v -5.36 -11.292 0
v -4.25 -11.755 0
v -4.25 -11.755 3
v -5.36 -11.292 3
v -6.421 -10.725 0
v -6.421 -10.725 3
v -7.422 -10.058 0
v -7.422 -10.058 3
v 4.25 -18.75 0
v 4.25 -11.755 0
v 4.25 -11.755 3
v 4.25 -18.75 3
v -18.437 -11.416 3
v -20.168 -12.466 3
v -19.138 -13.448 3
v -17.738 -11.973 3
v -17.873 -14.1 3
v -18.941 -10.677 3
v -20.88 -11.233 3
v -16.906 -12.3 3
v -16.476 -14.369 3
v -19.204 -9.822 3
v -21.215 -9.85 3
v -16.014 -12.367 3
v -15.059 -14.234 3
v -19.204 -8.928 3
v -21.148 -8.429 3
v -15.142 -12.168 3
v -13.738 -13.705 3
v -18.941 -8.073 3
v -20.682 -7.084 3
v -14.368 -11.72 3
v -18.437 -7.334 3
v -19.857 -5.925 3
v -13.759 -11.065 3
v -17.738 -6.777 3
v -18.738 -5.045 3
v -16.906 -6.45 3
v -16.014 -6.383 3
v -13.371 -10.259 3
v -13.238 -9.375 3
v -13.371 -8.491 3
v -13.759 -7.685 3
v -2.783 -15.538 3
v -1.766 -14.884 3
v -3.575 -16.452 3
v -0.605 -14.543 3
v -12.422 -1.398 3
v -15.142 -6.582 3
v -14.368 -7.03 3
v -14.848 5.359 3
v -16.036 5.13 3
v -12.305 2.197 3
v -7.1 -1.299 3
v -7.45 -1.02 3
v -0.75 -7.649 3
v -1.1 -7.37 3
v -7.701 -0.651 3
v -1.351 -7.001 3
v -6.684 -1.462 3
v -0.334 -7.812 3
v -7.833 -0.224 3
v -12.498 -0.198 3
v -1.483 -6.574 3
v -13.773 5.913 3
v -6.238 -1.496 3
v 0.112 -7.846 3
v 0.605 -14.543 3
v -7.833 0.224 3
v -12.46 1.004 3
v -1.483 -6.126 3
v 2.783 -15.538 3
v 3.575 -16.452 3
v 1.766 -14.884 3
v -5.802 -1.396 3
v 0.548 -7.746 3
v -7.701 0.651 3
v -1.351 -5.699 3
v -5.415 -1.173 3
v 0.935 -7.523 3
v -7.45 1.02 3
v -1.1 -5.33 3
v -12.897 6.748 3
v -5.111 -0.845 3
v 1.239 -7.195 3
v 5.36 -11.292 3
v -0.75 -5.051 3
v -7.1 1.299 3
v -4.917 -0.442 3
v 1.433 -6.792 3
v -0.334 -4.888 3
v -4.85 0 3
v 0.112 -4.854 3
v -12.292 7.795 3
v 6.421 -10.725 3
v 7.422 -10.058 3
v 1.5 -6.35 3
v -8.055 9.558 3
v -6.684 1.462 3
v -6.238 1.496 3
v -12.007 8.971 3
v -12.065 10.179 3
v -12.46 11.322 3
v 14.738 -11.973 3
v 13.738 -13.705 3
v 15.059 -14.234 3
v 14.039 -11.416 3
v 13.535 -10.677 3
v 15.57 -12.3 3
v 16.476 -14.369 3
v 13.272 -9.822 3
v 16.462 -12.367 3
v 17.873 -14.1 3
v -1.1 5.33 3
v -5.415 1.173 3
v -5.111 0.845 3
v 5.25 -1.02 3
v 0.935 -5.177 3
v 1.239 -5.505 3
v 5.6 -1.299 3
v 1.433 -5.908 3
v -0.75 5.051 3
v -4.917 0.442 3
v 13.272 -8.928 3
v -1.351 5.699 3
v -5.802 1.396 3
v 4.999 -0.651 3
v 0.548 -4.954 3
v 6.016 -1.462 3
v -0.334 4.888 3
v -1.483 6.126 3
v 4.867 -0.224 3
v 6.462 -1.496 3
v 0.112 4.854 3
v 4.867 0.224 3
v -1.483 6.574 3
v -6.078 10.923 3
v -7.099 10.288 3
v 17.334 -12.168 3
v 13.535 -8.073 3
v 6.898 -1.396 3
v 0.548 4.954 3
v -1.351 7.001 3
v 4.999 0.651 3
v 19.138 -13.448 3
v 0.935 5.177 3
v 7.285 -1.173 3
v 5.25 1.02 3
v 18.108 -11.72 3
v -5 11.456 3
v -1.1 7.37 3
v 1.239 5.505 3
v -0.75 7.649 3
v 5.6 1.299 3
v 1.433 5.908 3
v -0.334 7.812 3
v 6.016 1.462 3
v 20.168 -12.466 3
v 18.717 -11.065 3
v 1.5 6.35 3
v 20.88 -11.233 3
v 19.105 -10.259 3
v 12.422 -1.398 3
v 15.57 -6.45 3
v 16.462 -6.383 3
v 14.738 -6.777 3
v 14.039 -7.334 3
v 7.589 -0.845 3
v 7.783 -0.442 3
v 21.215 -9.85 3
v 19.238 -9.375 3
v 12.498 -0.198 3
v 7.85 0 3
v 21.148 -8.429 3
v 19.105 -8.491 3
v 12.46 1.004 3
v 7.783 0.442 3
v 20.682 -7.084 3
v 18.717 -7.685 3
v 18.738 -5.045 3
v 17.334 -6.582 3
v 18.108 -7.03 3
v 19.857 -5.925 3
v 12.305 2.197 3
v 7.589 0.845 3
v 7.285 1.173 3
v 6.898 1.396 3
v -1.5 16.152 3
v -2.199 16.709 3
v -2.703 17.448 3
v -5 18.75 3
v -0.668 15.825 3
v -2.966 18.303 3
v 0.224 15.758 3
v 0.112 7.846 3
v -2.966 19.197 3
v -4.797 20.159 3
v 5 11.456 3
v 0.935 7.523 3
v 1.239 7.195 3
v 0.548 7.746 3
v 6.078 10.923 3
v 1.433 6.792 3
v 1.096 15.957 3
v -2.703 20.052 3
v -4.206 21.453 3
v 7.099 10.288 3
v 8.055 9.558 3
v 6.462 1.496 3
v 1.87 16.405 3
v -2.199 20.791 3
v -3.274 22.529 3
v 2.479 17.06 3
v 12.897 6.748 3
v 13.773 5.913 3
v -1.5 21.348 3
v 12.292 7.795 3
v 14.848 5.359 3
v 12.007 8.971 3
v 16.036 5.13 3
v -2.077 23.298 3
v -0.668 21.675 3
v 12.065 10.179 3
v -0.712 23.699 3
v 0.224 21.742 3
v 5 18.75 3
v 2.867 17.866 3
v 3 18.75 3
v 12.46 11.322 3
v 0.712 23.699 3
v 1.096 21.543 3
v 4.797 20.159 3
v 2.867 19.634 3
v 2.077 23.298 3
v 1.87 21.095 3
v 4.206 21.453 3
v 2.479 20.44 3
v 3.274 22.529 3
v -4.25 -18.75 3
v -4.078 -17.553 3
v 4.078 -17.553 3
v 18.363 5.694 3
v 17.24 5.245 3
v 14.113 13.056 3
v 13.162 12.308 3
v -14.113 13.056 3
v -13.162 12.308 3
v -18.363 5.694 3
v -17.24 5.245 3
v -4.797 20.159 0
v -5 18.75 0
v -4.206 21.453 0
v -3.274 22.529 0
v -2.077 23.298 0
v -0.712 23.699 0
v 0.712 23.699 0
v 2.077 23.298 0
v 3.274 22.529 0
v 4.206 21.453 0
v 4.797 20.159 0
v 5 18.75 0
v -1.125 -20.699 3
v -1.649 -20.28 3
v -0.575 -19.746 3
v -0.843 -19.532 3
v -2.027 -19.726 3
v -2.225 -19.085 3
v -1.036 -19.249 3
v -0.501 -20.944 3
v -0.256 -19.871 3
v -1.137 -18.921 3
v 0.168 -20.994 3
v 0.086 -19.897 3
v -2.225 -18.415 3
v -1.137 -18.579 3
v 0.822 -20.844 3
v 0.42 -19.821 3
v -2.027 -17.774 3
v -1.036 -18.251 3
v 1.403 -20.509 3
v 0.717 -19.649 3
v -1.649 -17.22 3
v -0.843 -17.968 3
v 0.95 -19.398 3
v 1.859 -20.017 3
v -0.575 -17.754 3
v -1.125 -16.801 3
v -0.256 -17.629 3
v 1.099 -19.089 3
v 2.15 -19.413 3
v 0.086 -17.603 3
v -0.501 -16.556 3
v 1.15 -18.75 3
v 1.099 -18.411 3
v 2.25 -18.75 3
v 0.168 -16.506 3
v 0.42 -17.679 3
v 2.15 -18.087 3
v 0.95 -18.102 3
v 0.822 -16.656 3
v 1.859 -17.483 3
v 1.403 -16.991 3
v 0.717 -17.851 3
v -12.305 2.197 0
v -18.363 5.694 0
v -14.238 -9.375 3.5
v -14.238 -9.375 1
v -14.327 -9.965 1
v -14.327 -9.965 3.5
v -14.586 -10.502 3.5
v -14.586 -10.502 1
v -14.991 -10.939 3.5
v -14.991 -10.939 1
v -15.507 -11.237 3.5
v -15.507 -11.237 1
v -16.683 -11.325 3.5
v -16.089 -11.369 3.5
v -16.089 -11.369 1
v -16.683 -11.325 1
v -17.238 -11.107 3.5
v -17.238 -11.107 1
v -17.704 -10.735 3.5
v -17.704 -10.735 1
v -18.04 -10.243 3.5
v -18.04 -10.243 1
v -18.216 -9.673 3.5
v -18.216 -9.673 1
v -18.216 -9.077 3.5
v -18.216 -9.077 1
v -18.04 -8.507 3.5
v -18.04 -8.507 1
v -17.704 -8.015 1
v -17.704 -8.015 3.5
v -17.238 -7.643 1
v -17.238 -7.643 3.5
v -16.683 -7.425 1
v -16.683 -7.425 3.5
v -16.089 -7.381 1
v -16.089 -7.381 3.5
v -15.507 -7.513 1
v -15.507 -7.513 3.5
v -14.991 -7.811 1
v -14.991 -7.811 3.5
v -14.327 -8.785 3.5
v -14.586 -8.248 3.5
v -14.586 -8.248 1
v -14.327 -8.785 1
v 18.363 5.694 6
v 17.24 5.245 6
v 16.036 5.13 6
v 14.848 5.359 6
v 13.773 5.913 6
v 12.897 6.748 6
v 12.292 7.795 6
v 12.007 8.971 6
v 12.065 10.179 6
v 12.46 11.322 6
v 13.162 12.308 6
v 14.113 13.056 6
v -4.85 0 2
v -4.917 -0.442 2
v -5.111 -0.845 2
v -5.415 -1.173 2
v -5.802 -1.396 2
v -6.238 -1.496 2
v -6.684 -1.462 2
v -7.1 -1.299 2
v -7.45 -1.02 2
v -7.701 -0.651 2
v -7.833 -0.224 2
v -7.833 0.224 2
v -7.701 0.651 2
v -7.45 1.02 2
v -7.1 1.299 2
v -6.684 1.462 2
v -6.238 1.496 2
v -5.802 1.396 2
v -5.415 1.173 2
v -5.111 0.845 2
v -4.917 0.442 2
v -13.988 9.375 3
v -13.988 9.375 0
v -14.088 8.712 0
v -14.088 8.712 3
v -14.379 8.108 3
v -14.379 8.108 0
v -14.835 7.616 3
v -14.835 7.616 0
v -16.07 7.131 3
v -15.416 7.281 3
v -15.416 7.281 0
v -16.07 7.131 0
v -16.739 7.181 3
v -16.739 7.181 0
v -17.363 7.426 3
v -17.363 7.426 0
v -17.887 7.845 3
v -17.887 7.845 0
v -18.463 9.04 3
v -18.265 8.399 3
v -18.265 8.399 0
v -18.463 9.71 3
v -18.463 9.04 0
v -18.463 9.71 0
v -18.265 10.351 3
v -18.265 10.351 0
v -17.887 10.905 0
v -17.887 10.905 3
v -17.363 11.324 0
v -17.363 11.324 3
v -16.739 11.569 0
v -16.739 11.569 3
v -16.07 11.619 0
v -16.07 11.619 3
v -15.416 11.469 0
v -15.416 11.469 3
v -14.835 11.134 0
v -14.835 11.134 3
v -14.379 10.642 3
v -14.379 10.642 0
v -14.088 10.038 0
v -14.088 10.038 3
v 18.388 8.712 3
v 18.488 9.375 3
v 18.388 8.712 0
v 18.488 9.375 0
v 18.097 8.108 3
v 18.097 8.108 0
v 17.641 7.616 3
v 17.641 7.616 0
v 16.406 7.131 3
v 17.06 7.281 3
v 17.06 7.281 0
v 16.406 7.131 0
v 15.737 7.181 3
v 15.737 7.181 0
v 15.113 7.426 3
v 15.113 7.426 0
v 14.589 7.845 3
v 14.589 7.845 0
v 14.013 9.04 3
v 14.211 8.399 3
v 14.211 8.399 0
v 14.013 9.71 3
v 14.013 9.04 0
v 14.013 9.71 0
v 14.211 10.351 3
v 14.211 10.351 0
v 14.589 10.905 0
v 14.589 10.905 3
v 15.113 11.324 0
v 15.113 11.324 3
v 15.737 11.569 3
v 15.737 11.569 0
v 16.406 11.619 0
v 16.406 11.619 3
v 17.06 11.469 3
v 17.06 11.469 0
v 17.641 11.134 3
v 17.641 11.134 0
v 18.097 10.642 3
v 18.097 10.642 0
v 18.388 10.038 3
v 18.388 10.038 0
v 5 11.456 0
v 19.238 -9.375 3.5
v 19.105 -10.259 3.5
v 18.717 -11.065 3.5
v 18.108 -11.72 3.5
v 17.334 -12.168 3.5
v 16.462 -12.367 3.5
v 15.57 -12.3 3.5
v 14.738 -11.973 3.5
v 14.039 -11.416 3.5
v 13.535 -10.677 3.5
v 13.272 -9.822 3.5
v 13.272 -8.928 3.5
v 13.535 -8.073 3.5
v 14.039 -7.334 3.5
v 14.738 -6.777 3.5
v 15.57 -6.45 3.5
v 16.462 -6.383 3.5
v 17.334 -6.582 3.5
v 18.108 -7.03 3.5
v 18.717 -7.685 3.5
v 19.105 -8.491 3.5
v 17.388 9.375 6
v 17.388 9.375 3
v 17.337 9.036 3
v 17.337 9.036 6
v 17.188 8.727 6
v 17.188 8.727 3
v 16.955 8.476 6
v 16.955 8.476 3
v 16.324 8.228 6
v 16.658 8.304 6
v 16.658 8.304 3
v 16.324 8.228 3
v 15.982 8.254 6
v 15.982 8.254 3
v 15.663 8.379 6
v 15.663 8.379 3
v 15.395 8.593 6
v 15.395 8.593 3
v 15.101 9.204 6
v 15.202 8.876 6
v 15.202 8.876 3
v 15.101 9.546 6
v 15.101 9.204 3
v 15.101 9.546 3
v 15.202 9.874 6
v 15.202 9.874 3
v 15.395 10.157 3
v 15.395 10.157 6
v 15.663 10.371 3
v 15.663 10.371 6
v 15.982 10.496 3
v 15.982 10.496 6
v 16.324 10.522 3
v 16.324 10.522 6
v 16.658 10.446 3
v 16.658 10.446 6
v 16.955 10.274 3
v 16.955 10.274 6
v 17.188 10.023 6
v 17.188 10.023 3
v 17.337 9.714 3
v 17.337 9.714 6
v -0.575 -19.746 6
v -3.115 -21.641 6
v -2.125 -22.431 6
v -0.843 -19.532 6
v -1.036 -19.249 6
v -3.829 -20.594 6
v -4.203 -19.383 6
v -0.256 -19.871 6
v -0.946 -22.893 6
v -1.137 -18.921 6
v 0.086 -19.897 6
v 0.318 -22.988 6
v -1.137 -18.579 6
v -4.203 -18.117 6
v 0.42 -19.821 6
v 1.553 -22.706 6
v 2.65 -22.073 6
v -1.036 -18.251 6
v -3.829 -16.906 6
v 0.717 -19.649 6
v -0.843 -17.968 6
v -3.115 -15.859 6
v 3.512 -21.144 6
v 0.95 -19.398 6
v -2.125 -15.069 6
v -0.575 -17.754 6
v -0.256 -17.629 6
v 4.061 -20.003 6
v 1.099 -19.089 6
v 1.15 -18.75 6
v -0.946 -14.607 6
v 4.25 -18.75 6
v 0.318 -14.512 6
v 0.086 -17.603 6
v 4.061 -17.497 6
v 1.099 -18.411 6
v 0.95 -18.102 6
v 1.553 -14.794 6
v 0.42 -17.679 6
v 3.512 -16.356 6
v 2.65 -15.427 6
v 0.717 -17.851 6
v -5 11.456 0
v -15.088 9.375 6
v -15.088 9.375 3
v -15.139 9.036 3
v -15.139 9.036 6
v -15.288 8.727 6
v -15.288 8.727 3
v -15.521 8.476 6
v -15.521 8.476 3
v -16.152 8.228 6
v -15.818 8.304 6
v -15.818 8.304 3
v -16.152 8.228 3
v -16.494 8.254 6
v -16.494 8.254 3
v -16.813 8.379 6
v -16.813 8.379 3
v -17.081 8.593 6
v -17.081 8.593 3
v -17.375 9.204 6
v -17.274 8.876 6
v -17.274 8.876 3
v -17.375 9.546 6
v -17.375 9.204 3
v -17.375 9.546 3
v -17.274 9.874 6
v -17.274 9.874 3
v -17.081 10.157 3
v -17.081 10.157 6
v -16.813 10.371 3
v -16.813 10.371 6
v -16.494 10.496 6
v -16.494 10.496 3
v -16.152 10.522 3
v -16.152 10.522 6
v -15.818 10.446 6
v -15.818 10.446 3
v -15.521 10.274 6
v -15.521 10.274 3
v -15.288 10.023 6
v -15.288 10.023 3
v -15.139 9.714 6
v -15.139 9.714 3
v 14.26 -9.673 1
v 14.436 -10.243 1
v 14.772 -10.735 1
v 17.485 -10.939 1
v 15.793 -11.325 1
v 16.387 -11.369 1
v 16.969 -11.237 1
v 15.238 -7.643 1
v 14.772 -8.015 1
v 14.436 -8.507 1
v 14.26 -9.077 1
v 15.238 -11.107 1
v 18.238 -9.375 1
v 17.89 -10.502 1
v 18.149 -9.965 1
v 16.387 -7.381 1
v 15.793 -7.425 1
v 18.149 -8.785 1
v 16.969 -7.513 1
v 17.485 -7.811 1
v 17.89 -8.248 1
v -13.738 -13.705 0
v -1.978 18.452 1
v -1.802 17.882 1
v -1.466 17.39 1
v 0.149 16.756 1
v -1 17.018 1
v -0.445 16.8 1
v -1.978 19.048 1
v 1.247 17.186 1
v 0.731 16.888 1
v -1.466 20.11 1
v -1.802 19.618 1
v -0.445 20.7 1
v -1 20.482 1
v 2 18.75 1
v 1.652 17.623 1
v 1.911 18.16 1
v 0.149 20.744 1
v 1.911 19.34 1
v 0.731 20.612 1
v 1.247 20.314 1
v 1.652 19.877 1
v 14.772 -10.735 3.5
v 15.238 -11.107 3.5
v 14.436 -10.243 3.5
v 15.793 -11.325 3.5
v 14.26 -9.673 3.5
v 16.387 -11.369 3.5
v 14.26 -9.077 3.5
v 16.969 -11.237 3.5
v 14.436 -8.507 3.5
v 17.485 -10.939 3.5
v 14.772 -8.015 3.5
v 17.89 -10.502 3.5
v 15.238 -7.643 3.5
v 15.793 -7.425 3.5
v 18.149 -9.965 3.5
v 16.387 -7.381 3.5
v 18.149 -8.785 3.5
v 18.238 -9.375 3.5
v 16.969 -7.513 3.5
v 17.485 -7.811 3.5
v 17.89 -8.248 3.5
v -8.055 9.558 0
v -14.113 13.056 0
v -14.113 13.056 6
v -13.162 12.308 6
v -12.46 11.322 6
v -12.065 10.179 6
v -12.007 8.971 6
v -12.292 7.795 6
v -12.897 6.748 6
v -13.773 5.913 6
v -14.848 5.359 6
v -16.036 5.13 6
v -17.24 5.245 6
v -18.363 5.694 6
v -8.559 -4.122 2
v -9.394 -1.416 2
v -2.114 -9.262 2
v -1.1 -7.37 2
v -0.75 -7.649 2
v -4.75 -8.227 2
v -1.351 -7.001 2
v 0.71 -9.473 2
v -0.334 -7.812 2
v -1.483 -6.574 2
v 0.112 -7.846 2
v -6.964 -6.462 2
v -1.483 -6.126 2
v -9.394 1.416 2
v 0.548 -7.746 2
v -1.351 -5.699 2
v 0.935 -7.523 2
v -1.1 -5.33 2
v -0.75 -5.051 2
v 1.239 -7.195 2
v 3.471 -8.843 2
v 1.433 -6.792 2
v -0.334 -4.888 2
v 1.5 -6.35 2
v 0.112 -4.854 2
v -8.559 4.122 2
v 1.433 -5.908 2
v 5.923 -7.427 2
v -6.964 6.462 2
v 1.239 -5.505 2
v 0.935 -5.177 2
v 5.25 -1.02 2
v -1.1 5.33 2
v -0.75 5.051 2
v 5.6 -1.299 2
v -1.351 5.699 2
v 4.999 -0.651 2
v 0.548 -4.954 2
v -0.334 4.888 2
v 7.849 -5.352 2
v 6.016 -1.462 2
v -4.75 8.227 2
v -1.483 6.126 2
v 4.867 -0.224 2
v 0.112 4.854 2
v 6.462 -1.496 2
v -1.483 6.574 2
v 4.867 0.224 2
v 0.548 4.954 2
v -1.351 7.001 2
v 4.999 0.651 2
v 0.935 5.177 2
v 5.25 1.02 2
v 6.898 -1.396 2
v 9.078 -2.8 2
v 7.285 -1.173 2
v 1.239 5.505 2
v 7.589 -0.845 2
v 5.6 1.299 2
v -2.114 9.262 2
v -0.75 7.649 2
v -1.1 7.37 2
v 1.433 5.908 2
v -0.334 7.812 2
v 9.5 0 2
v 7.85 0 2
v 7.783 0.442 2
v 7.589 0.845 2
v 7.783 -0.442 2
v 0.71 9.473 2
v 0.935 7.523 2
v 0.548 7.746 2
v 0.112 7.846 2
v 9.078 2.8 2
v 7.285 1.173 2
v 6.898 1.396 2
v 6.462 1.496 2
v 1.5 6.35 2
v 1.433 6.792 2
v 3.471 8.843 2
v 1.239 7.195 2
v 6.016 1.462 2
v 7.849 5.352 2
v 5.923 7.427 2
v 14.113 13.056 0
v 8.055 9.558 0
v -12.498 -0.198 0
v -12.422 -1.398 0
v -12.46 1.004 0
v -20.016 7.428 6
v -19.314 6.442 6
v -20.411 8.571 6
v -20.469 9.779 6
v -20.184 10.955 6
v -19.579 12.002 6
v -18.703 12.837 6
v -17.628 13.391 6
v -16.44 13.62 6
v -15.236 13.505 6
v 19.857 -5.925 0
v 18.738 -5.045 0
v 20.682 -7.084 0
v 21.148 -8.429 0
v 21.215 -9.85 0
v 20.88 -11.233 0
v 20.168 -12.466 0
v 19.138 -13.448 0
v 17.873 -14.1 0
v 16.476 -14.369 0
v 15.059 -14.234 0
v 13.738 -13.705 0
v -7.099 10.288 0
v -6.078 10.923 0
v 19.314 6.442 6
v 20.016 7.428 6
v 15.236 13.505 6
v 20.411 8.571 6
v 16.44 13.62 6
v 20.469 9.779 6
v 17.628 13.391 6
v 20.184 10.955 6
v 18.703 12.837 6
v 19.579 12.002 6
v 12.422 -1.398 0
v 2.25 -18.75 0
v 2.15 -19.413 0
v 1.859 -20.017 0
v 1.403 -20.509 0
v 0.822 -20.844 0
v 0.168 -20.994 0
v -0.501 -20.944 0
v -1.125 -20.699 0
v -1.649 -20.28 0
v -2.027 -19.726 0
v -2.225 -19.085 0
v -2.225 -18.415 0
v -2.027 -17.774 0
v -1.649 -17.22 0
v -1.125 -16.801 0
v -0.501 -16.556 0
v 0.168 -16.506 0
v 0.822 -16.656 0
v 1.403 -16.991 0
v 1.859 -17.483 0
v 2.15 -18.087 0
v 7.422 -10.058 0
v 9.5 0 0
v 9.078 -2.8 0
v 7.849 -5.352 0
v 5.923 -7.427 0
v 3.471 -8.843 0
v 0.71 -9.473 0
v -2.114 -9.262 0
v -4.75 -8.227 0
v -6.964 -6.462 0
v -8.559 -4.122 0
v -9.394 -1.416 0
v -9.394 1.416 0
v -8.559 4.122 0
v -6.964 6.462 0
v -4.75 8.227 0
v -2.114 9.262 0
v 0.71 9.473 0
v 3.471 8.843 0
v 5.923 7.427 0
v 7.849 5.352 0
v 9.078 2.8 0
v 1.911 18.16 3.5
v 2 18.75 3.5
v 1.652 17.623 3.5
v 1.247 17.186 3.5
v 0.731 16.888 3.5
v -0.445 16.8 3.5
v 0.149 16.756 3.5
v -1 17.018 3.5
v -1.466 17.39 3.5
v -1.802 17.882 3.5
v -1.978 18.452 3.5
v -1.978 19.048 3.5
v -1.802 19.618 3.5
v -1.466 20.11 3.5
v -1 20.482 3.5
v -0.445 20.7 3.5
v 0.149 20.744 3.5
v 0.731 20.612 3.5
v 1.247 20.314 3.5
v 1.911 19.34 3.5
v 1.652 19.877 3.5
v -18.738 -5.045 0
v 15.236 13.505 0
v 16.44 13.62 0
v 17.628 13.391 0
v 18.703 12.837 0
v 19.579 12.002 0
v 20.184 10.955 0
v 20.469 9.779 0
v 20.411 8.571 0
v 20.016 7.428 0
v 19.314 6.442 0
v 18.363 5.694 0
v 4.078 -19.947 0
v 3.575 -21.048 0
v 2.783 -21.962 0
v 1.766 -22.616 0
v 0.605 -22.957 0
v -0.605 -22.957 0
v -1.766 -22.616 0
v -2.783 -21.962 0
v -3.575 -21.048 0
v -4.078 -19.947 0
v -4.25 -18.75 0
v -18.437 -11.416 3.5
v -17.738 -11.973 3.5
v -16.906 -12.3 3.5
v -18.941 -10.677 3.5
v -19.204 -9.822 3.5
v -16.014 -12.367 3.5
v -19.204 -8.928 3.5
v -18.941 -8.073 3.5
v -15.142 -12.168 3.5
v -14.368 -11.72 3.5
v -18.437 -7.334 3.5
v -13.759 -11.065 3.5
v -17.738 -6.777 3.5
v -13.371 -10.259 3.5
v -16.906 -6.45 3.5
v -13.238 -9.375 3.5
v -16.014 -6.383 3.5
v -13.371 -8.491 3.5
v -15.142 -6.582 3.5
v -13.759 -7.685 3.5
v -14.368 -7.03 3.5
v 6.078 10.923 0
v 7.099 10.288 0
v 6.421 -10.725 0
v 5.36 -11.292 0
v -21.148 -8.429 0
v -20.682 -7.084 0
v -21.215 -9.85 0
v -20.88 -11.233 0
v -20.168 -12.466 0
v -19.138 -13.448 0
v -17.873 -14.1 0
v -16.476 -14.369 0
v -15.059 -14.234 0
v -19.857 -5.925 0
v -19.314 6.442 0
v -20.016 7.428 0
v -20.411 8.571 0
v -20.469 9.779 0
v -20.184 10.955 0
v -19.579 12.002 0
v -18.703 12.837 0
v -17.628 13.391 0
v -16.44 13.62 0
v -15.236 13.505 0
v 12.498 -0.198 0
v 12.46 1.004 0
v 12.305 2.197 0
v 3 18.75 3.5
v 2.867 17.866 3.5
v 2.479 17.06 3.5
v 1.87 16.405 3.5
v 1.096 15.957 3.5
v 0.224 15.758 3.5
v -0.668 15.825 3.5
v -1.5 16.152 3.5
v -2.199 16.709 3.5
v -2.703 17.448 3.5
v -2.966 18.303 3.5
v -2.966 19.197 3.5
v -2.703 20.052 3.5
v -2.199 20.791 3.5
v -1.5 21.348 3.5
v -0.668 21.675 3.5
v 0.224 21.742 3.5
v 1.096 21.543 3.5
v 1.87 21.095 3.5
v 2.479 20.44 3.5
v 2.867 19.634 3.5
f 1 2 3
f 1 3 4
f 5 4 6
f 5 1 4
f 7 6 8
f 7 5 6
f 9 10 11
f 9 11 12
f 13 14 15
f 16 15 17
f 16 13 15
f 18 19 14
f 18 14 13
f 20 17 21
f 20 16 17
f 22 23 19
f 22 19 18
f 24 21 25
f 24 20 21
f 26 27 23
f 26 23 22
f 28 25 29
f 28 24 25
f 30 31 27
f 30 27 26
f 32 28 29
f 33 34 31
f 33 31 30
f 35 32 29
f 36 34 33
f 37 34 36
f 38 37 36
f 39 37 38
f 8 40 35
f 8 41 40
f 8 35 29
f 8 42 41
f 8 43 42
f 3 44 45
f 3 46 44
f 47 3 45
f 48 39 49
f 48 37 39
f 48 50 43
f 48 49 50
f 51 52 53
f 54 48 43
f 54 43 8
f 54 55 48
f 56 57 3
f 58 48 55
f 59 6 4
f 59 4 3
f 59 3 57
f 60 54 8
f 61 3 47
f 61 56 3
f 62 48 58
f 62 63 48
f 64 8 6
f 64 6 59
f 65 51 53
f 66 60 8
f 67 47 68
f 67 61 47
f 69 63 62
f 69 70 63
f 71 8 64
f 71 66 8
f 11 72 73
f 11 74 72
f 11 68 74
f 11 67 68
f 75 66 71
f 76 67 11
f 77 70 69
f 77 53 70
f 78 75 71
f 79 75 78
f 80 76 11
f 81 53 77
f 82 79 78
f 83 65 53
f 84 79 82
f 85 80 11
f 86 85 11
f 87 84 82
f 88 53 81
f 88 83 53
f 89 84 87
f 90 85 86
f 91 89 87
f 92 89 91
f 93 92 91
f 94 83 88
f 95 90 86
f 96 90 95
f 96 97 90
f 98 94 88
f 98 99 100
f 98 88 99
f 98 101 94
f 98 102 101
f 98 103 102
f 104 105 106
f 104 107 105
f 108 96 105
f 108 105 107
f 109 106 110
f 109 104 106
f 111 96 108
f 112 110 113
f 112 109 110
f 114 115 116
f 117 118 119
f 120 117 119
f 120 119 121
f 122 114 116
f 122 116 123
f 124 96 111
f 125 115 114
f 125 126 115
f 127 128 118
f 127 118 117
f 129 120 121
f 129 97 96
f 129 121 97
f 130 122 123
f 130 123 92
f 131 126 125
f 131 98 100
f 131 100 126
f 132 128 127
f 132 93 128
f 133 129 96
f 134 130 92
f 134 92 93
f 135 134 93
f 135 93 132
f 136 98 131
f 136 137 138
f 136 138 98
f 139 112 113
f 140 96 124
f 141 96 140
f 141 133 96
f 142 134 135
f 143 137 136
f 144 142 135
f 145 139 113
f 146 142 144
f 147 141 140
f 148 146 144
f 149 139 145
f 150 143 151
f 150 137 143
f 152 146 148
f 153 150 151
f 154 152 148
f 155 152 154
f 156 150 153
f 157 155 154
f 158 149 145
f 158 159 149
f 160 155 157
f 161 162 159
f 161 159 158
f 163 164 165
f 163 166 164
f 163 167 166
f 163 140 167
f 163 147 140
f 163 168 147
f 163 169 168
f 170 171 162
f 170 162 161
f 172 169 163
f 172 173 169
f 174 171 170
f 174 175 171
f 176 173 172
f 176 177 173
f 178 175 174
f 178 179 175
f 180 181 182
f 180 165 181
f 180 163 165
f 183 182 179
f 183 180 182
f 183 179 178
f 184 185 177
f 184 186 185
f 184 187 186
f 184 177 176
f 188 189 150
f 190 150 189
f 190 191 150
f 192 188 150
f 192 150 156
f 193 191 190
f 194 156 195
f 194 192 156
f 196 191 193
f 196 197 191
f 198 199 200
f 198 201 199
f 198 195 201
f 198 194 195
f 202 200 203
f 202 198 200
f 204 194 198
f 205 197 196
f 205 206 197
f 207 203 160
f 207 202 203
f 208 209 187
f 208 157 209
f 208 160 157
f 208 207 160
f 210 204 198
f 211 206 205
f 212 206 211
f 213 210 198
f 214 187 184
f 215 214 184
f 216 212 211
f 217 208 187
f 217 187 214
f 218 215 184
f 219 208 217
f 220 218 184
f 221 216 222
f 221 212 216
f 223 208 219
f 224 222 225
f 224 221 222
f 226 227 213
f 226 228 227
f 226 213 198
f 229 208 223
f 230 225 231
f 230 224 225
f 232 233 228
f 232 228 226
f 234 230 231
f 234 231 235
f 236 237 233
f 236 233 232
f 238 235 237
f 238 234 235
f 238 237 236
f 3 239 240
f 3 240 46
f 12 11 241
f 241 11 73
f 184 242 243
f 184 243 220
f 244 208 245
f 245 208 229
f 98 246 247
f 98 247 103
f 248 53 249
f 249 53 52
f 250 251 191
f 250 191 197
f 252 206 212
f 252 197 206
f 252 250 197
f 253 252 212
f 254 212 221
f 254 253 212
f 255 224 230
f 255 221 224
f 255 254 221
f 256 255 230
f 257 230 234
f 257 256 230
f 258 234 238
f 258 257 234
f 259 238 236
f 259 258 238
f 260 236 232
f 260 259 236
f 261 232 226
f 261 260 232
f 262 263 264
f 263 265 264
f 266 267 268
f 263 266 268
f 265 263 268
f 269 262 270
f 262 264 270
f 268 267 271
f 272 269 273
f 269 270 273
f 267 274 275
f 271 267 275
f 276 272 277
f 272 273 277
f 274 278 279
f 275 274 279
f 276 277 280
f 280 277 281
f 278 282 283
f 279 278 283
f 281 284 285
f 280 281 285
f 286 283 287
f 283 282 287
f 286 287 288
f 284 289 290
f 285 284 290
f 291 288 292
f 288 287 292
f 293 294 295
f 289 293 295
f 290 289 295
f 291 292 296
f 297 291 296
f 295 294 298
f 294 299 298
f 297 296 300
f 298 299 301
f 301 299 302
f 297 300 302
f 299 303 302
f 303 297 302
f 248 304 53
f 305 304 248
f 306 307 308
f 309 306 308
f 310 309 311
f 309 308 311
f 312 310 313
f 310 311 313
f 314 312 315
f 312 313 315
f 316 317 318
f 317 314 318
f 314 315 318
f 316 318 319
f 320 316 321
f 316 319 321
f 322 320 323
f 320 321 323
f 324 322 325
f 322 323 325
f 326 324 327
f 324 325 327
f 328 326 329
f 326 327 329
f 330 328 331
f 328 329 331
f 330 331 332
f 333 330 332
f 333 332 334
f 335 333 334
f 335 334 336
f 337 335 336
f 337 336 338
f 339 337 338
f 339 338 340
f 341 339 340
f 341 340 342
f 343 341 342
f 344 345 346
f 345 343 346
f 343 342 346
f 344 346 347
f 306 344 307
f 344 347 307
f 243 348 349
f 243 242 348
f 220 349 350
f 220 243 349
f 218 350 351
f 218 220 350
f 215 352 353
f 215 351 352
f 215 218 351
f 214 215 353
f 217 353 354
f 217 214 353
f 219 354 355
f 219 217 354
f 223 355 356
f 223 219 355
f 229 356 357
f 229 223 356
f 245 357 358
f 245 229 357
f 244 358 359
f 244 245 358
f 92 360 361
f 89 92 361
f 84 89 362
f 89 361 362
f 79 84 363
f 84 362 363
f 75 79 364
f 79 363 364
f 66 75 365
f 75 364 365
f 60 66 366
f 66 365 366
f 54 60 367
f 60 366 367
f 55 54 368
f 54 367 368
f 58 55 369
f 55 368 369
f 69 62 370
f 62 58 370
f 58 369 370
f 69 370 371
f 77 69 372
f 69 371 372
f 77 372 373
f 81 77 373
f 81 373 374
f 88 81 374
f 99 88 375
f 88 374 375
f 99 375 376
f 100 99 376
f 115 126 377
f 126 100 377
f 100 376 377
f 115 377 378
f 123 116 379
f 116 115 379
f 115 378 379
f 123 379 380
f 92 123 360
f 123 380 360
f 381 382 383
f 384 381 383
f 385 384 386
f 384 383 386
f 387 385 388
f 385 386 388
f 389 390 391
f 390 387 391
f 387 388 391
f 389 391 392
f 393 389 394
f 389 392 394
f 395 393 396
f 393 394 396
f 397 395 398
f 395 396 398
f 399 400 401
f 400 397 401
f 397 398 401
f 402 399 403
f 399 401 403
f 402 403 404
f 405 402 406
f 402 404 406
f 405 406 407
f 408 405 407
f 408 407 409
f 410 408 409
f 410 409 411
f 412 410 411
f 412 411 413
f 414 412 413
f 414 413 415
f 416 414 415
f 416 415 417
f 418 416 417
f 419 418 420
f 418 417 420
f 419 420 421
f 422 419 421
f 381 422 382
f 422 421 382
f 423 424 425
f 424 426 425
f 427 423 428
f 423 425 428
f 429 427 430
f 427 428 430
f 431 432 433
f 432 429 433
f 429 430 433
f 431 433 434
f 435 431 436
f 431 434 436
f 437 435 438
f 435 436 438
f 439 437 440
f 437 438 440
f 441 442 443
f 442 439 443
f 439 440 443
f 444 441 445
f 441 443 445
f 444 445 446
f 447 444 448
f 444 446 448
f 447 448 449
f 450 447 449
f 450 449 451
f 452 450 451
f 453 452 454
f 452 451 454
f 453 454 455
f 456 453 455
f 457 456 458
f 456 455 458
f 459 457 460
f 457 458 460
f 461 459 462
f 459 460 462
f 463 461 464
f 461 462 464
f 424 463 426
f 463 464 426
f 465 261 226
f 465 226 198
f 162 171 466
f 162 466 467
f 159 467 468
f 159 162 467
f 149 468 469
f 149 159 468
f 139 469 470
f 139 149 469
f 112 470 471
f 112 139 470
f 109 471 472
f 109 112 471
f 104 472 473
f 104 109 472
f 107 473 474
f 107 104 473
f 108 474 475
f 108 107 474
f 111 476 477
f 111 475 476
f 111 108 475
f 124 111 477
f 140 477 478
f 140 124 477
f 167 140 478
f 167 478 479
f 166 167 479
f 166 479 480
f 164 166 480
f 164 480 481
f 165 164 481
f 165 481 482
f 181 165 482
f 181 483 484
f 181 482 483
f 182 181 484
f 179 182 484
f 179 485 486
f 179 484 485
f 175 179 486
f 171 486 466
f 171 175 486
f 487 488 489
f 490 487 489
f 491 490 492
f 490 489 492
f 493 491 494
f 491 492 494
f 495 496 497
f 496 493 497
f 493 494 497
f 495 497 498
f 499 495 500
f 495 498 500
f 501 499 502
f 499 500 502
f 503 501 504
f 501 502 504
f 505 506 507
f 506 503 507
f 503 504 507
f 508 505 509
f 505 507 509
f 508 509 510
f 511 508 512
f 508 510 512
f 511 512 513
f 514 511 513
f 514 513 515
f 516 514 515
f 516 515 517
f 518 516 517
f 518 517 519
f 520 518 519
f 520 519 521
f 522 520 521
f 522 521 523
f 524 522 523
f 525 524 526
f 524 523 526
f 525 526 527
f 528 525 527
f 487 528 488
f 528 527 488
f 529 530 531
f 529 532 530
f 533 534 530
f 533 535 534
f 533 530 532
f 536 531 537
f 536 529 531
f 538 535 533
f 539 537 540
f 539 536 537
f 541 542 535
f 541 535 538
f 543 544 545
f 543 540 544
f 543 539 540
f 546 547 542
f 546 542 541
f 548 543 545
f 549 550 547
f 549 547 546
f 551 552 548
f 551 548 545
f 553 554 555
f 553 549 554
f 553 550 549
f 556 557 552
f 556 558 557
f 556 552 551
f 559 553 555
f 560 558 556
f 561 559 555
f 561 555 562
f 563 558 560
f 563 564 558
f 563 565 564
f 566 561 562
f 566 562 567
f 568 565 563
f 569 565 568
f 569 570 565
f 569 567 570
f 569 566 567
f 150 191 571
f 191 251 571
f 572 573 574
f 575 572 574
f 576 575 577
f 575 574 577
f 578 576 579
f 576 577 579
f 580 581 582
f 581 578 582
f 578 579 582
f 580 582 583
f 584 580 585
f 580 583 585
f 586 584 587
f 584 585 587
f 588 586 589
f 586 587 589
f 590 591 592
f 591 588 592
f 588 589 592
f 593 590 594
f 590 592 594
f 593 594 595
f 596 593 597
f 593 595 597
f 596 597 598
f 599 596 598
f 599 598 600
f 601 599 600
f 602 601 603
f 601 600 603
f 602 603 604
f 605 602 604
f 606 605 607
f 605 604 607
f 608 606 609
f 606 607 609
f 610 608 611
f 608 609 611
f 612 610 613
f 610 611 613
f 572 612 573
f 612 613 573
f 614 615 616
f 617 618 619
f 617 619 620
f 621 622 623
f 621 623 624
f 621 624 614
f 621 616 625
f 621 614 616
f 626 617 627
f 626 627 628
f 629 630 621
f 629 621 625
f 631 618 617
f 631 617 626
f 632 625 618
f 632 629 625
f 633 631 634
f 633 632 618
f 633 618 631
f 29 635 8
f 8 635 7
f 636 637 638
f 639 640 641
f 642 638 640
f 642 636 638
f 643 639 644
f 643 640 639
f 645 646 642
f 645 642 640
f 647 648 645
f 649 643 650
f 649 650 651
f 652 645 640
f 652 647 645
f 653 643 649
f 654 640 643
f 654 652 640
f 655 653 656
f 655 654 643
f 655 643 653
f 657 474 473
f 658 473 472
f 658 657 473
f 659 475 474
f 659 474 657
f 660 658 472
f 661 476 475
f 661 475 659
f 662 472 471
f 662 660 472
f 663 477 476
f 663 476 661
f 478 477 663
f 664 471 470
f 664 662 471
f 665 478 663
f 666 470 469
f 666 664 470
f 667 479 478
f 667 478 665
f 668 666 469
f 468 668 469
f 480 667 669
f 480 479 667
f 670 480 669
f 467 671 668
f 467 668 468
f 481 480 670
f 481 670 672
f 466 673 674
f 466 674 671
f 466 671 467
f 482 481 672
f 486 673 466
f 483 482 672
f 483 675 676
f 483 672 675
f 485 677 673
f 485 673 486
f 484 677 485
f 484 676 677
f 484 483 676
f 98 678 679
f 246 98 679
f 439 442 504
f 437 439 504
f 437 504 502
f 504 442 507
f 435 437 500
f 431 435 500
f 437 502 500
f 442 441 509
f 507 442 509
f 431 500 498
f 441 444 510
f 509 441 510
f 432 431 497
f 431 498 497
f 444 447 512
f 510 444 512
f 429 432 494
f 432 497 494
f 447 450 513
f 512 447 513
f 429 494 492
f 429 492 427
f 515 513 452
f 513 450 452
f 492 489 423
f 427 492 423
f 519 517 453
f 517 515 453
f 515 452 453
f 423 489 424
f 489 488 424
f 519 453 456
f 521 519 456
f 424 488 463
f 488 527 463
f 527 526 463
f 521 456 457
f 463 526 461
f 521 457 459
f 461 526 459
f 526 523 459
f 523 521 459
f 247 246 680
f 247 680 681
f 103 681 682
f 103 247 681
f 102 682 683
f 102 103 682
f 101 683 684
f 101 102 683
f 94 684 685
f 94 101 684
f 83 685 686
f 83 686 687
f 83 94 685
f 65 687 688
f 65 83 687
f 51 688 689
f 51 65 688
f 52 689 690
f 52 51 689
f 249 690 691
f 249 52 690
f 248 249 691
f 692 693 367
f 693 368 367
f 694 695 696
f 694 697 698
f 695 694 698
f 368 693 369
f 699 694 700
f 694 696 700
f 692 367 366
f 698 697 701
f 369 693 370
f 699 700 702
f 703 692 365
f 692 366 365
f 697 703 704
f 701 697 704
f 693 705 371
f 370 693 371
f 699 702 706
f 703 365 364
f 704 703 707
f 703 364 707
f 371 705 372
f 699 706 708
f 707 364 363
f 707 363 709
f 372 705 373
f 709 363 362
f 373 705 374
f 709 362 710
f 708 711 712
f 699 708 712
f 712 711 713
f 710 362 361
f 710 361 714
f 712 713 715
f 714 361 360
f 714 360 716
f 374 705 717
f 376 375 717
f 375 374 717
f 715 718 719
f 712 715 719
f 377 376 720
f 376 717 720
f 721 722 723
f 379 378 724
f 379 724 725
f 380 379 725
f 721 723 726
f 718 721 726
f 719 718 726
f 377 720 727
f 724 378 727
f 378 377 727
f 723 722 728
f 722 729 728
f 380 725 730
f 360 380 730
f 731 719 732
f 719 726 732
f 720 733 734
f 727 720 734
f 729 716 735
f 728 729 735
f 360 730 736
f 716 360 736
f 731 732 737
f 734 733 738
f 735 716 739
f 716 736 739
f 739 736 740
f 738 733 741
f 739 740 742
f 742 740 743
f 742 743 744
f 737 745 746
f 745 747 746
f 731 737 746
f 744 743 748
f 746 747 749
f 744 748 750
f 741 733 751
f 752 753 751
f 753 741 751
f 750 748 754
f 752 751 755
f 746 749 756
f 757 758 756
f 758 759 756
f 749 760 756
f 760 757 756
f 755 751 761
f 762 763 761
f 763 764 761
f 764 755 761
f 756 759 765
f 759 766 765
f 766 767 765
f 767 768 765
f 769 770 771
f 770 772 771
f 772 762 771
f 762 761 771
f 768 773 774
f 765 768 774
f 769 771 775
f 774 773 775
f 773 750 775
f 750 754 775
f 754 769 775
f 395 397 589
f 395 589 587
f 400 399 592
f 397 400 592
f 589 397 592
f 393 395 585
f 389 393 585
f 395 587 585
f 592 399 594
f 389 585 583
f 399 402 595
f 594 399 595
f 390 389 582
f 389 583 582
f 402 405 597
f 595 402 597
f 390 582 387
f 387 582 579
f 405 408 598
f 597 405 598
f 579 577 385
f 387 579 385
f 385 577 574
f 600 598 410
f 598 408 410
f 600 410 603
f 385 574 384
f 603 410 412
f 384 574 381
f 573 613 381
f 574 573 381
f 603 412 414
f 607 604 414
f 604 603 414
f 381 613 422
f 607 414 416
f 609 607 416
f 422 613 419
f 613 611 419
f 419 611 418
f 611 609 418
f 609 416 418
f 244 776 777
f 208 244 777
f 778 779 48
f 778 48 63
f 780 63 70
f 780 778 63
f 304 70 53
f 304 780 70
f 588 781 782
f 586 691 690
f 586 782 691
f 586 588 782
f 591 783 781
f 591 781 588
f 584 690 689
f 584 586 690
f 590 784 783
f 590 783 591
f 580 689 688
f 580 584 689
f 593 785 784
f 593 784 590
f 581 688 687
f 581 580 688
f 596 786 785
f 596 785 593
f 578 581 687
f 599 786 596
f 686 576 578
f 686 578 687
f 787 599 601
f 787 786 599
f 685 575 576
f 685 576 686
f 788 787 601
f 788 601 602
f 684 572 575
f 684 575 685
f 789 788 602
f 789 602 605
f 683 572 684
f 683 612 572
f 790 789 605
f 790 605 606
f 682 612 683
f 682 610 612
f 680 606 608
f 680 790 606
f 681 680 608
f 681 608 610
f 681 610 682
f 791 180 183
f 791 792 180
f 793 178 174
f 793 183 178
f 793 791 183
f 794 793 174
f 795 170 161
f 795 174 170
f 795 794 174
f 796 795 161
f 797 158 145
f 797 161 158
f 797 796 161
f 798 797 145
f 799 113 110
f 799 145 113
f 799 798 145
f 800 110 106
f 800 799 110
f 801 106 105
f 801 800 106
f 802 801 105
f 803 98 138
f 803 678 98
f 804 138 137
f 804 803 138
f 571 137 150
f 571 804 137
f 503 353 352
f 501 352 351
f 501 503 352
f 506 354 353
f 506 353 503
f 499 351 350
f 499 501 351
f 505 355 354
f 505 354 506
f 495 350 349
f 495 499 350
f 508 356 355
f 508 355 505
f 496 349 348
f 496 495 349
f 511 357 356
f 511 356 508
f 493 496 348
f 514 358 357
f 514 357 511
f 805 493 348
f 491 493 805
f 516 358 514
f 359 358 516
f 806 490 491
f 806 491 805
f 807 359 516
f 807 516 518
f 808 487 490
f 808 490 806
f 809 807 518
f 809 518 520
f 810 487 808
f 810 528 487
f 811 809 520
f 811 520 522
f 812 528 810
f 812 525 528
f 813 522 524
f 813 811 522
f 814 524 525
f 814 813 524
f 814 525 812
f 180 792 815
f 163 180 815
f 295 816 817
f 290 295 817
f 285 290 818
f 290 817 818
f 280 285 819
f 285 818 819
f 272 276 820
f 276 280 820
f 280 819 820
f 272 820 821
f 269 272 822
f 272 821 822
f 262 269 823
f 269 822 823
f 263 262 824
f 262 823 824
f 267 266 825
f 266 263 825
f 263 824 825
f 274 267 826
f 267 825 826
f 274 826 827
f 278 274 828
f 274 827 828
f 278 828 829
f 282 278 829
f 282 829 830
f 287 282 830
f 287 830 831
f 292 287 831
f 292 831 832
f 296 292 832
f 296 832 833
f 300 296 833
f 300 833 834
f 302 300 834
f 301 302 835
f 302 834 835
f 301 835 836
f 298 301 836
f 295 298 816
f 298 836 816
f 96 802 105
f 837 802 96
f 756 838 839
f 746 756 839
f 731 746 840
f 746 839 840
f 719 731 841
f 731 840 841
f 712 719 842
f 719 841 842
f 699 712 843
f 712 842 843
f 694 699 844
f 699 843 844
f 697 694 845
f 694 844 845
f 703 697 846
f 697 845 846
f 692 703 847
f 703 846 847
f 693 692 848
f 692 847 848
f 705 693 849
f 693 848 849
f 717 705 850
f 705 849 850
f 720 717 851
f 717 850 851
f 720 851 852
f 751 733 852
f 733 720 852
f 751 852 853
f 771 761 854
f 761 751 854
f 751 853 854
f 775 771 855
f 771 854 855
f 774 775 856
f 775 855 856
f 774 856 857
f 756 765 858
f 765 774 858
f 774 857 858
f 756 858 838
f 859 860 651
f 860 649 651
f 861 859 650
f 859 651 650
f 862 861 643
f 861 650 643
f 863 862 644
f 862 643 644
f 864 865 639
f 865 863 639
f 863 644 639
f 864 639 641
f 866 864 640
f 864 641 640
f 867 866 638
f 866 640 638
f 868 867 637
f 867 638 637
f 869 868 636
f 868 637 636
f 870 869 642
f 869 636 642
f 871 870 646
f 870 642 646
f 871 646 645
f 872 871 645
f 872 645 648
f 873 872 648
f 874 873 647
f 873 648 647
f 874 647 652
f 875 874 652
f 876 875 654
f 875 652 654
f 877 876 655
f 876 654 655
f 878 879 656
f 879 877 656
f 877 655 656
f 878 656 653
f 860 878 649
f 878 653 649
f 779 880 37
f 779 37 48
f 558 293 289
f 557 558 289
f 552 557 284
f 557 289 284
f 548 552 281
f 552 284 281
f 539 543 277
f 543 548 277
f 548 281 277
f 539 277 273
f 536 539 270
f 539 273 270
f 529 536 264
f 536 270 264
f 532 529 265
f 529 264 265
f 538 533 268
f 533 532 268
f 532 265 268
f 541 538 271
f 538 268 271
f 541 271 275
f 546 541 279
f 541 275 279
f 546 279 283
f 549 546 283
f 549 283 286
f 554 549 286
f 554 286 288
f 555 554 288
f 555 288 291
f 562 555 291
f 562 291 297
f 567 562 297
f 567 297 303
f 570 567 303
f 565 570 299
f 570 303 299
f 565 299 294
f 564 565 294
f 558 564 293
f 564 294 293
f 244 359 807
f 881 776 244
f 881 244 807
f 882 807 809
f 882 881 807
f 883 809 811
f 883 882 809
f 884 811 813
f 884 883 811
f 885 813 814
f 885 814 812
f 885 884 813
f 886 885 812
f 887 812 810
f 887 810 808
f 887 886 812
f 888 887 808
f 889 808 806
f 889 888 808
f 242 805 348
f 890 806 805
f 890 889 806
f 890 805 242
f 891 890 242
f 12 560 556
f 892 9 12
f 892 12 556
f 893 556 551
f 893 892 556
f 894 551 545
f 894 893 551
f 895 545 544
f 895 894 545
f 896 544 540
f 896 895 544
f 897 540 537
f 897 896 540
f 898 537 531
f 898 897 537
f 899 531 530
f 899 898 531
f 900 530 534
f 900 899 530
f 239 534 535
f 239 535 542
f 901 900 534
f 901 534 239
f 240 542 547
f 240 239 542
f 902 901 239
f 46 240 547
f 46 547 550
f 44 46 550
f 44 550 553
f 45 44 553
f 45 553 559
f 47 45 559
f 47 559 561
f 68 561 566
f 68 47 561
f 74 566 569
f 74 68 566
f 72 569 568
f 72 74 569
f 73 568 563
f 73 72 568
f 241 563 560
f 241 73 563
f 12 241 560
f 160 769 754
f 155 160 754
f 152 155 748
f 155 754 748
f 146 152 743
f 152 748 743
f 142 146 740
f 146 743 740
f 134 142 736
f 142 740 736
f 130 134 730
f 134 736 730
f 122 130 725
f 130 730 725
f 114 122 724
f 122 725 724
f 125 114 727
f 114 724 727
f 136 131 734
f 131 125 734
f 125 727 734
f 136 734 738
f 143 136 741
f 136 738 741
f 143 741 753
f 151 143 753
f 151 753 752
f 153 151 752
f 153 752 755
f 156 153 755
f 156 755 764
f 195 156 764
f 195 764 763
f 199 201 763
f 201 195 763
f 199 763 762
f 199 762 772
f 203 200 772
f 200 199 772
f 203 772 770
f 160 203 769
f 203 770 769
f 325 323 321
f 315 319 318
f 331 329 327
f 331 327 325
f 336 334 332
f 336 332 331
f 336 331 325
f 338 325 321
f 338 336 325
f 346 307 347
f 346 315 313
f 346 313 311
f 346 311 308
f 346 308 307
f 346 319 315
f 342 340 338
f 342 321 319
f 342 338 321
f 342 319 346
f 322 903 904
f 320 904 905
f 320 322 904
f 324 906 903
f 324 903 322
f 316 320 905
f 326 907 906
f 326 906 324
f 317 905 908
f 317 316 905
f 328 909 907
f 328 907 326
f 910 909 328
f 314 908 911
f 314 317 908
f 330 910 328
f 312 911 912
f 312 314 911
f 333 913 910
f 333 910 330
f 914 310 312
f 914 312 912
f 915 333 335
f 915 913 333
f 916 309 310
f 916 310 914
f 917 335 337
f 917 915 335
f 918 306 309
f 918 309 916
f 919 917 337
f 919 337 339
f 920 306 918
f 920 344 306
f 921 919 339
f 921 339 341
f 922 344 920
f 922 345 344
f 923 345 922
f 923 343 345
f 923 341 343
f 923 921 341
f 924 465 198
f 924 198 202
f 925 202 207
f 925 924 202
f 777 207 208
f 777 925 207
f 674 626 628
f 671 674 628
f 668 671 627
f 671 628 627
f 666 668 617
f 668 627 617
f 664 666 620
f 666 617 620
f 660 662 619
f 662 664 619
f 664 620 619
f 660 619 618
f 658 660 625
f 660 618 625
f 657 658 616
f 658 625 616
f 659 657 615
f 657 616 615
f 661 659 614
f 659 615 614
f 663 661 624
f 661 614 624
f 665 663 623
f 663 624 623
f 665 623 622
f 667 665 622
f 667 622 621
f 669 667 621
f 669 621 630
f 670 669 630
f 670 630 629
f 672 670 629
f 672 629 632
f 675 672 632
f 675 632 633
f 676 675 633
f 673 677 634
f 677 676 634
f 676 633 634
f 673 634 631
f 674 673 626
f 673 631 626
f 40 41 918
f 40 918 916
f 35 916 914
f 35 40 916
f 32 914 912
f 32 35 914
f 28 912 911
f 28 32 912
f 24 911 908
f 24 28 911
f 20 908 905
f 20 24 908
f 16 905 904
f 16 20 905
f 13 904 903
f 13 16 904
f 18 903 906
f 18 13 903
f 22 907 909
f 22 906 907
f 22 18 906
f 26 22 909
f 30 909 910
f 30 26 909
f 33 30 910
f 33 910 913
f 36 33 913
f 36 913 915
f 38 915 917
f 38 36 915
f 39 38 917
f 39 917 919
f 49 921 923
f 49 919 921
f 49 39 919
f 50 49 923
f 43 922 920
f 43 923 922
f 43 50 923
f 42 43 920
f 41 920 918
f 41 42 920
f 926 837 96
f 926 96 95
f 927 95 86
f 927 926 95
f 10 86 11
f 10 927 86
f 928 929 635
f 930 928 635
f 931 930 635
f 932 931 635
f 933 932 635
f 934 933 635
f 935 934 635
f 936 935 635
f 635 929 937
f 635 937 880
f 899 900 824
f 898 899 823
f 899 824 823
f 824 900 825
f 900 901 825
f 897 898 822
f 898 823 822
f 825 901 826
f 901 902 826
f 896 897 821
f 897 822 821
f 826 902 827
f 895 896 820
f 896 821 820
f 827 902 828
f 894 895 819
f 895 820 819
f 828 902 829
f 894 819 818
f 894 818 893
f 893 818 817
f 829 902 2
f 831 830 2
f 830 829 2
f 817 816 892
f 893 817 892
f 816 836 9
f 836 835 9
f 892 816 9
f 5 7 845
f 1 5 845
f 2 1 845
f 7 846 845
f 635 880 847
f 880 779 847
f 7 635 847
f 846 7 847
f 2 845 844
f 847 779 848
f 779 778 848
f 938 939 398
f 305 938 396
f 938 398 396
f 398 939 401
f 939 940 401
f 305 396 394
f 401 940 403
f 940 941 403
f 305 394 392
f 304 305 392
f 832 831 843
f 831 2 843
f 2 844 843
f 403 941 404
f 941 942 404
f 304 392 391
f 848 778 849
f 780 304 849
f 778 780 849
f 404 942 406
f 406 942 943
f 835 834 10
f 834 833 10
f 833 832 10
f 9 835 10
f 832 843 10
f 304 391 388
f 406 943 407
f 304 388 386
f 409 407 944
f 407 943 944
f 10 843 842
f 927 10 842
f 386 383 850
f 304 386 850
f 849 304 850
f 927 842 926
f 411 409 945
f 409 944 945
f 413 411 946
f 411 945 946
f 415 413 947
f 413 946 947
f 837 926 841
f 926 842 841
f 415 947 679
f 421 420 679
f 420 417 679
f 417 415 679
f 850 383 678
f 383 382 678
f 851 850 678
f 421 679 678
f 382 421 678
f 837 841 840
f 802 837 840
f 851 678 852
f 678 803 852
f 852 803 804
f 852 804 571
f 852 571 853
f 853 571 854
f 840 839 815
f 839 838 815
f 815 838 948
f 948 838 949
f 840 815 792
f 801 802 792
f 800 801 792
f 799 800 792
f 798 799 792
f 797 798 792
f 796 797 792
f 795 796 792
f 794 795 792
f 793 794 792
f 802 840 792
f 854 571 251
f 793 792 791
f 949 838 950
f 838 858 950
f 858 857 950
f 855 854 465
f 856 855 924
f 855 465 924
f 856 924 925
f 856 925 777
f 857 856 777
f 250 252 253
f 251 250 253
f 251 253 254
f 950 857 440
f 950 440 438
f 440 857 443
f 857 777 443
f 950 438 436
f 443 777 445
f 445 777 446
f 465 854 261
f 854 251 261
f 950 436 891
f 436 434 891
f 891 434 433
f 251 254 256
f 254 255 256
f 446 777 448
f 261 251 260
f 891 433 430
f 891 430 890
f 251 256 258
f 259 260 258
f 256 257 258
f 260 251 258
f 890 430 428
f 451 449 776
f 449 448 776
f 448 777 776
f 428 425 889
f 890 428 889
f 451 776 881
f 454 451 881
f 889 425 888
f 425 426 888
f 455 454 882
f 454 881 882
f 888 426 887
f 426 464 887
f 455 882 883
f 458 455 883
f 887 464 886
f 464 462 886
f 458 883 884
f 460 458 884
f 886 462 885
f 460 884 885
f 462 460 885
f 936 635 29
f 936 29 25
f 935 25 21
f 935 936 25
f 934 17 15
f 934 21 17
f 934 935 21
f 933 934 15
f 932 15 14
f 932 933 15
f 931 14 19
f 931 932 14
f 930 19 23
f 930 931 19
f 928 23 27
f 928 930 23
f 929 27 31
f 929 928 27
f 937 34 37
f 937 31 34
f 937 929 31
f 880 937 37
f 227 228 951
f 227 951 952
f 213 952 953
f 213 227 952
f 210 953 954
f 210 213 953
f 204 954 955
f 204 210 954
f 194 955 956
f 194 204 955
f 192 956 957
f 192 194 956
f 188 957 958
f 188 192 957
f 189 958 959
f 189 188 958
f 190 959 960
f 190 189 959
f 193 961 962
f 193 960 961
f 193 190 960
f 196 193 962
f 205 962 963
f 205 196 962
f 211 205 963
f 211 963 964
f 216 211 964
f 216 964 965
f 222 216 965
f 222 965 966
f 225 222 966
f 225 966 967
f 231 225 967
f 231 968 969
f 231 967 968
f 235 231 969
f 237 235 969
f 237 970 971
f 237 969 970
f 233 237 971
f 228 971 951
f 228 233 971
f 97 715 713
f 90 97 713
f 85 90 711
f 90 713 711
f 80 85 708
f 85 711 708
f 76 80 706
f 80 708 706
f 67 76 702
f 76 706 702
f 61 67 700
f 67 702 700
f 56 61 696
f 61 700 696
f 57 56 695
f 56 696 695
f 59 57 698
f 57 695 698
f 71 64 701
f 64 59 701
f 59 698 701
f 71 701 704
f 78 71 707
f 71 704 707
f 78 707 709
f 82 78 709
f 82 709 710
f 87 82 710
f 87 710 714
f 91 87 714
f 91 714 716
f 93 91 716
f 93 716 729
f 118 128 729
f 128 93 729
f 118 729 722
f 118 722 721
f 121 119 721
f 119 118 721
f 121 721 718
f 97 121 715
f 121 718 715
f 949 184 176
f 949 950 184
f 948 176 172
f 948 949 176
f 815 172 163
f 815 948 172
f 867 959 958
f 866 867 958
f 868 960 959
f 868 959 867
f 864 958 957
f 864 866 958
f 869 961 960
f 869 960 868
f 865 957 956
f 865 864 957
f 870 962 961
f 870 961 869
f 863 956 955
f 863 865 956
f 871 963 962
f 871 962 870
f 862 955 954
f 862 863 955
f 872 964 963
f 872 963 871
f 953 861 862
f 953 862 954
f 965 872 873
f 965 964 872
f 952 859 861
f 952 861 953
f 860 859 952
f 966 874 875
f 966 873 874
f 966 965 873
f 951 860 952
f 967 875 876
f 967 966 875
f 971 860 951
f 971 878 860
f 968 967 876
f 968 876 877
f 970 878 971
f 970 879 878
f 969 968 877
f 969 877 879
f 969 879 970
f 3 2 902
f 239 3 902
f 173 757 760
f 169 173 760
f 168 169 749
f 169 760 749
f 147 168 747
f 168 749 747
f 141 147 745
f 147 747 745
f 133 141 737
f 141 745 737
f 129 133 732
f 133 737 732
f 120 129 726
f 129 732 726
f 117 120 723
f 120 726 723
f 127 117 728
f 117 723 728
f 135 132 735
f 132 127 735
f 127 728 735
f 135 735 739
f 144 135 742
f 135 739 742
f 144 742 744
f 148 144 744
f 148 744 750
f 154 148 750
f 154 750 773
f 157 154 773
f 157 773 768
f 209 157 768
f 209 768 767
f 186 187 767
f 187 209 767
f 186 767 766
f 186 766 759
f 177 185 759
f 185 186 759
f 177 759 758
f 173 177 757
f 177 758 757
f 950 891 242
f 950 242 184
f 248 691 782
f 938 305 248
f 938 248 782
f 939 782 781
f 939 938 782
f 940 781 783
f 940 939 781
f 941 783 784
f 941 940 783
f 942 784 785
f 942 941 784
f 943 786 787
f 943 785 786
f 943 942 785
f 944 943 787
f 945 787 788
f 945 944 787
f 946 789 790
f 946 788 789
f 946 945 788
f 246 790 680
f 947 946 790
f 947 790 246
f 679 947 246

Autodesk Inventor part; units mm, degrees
ref_plane "YZ Plane" through (0, 0, 0) normal (1, 0, 0) x (0, 1, 0)
ref_plane "XZ Plane" through (0, 0, 0) normal (0, 1, 0) x (-1, 0, 0)
ref_plane "XY Plane" through (0, 0, 0) normal (0, 0, 1) x (1, 0, 0)
sketch "Skizze1" plane through (0, 0, 0) normal (0, 0, 1) x (1, 0, 0)
  circle A0 centre (0, 0) radius 18.75 construction
  circle A1 centre (0, 0) radius 9.5
  circle A2 centre (0, 18.75) radius 2
  line L0 (0, 0) -> (-16.238, -9.375) construction
  line L1 (0, 33.1) -> (0, -32.35) construction
  line L2 (-32.2953, 0) -> (32.2953, 0) construction
  circle A3 centre (0, 0) radius 6.35 construction
  circle A4 centre (0, 6.35) radius 1.5
  circle A5 centre (0, -6.35) radius 1.5
  circle A6 centre (6.35, 0) radius 1.5
  circle A7 centre (-6.35, 0) radius 1.5
  arc A8 (-5, 11.4564) -> (5, 11.4564) centre (0, 0) ccw
  arc A9 (5, 18.75) -> (-5, 18.75) centre (0, 18.75) ccw
  line L3 (-5, 18.75) -> (-5, 11.4564)
  line L4 (5, 18.75) -> (5, 11.4564)
  circle A10 centre (16.238, -9.375) radius 2
  arc A11 (13.738, -13.7051) -> (18.738, -5.0449) centre (16.238, -9.375) ccw
  line L5 (18.738, -5.0449) -> (12.4216, -1.3981)
  line L6 (13.738, -13.7051) -> (7.4216, -10.0583)
  circle A12 centre (-16.238, -9.375) radius 2
  arc A13 (-18.738, -5.0449) -> (-13.738, -13.7051) centre (-16.238, -9.375) ccw
  line L7 (-18.738, -5.0449) -> (-12.4216, -1.3981)
  line L8 (-13.738, -13.7051) -> (-7.4216, -10.0583)
  circle A14 centre (0, 18.75) radius 3
  circle A15 centre (16.238, -9.375) radius 3
  circle A16 centre (-16.238, -9.375) radius 3
  circle A17 centre (0, -18.75) radius 1.15
  circle A18 centre (16.238, 9.375) radius 1.15
  circle A19 centre (-16.238, 9.375) radius 1.15
  circle A20 centre (16.238, 9.375) radius 2.25
  circle A21 centre (0, -18.75) radius 2.25
  circle A22 centre (-16.238, 9.375) radius 2.25
  arc A23 (18.363, 5.6944) -> (14.113, 13.0556) centre (16.238, 9.375) ccw
  arc A24 (-4.25, -18.75) -> (4.25, -18.75) centre (0, -18.75) ccw
  arc A25 (-14.113, 13.0556) -> (-18.363, 5.6944) centre (-16.238, 9.375) ccw
  line L9 (18.363, 5.6944) -> (12.3054, 2.1971)
  line L10 (14.113, 13.0556) -> (8.0554, 9.5583)
  line L11 (4.25, -11.7553) -> (4.25, -18.75)
  line L12 (-4.25, -11.7553) -> (-4.25, -18.75)
  line L13 (-8.0554, 9.5583) -> (-14.113, 13.0556)
  line L14 (-12.3054, 2.1971) -> (-18.363, 5.6944)
  circle A26 centre (0, -18.75) radius 4.25
  circle A27 centre (16.238, 9.375) radius 4.25
  circle A28 centre (-16.238, 9.375) radius 4.25
  dimension "d0" = 37.5
  dimension "d1" = 4
  dimension "d2" = 30
  dimension "d3" = 19
  dimension "d4" = 12.7
  dimension "d5" = 3
  dimension "d7" = 3
  dimension "d8" = 3
  dimension "d17" = 1
  dimension "d20" = 2.3
  dimension "d22" = 2
  dimension "d23" = 4.5
extrude "Extrusion1" add sketch "Skizze1" along normal blind 3 contours A1 | A2 | L3 A9 L4 A8 | A8 L14 A28 L13 | A28 A25 | A8 L8 A13 L7 | L10 A27 L9 A8 | A8 L11 A26 L12 | A23 A27 | A26 A24 | L5 A11 L6 A8 | A10 | A12 | A14 | A15 | A16
extrude "Extrusion3" cut sketch "Skizze1" along normal blind 2 contours A1
extrude "Extrusion4" cut sketch "Skizze1" against normal blind 2 from surface at 3 contours A2 | A10 | A12
extrude "Extrusion5" add sketch "Skizze1" along normal blind 0.5 from surface at 3 contours A14 | A15 | A16
extrude "Extrusion6" add sketch "Skizze1" along normal blind 3 from surface at 3 contours A28 A25 | A23 A27 | A26 A24 | A20 | A21 | A22
properties part number "PlanetaryHolderTop"
